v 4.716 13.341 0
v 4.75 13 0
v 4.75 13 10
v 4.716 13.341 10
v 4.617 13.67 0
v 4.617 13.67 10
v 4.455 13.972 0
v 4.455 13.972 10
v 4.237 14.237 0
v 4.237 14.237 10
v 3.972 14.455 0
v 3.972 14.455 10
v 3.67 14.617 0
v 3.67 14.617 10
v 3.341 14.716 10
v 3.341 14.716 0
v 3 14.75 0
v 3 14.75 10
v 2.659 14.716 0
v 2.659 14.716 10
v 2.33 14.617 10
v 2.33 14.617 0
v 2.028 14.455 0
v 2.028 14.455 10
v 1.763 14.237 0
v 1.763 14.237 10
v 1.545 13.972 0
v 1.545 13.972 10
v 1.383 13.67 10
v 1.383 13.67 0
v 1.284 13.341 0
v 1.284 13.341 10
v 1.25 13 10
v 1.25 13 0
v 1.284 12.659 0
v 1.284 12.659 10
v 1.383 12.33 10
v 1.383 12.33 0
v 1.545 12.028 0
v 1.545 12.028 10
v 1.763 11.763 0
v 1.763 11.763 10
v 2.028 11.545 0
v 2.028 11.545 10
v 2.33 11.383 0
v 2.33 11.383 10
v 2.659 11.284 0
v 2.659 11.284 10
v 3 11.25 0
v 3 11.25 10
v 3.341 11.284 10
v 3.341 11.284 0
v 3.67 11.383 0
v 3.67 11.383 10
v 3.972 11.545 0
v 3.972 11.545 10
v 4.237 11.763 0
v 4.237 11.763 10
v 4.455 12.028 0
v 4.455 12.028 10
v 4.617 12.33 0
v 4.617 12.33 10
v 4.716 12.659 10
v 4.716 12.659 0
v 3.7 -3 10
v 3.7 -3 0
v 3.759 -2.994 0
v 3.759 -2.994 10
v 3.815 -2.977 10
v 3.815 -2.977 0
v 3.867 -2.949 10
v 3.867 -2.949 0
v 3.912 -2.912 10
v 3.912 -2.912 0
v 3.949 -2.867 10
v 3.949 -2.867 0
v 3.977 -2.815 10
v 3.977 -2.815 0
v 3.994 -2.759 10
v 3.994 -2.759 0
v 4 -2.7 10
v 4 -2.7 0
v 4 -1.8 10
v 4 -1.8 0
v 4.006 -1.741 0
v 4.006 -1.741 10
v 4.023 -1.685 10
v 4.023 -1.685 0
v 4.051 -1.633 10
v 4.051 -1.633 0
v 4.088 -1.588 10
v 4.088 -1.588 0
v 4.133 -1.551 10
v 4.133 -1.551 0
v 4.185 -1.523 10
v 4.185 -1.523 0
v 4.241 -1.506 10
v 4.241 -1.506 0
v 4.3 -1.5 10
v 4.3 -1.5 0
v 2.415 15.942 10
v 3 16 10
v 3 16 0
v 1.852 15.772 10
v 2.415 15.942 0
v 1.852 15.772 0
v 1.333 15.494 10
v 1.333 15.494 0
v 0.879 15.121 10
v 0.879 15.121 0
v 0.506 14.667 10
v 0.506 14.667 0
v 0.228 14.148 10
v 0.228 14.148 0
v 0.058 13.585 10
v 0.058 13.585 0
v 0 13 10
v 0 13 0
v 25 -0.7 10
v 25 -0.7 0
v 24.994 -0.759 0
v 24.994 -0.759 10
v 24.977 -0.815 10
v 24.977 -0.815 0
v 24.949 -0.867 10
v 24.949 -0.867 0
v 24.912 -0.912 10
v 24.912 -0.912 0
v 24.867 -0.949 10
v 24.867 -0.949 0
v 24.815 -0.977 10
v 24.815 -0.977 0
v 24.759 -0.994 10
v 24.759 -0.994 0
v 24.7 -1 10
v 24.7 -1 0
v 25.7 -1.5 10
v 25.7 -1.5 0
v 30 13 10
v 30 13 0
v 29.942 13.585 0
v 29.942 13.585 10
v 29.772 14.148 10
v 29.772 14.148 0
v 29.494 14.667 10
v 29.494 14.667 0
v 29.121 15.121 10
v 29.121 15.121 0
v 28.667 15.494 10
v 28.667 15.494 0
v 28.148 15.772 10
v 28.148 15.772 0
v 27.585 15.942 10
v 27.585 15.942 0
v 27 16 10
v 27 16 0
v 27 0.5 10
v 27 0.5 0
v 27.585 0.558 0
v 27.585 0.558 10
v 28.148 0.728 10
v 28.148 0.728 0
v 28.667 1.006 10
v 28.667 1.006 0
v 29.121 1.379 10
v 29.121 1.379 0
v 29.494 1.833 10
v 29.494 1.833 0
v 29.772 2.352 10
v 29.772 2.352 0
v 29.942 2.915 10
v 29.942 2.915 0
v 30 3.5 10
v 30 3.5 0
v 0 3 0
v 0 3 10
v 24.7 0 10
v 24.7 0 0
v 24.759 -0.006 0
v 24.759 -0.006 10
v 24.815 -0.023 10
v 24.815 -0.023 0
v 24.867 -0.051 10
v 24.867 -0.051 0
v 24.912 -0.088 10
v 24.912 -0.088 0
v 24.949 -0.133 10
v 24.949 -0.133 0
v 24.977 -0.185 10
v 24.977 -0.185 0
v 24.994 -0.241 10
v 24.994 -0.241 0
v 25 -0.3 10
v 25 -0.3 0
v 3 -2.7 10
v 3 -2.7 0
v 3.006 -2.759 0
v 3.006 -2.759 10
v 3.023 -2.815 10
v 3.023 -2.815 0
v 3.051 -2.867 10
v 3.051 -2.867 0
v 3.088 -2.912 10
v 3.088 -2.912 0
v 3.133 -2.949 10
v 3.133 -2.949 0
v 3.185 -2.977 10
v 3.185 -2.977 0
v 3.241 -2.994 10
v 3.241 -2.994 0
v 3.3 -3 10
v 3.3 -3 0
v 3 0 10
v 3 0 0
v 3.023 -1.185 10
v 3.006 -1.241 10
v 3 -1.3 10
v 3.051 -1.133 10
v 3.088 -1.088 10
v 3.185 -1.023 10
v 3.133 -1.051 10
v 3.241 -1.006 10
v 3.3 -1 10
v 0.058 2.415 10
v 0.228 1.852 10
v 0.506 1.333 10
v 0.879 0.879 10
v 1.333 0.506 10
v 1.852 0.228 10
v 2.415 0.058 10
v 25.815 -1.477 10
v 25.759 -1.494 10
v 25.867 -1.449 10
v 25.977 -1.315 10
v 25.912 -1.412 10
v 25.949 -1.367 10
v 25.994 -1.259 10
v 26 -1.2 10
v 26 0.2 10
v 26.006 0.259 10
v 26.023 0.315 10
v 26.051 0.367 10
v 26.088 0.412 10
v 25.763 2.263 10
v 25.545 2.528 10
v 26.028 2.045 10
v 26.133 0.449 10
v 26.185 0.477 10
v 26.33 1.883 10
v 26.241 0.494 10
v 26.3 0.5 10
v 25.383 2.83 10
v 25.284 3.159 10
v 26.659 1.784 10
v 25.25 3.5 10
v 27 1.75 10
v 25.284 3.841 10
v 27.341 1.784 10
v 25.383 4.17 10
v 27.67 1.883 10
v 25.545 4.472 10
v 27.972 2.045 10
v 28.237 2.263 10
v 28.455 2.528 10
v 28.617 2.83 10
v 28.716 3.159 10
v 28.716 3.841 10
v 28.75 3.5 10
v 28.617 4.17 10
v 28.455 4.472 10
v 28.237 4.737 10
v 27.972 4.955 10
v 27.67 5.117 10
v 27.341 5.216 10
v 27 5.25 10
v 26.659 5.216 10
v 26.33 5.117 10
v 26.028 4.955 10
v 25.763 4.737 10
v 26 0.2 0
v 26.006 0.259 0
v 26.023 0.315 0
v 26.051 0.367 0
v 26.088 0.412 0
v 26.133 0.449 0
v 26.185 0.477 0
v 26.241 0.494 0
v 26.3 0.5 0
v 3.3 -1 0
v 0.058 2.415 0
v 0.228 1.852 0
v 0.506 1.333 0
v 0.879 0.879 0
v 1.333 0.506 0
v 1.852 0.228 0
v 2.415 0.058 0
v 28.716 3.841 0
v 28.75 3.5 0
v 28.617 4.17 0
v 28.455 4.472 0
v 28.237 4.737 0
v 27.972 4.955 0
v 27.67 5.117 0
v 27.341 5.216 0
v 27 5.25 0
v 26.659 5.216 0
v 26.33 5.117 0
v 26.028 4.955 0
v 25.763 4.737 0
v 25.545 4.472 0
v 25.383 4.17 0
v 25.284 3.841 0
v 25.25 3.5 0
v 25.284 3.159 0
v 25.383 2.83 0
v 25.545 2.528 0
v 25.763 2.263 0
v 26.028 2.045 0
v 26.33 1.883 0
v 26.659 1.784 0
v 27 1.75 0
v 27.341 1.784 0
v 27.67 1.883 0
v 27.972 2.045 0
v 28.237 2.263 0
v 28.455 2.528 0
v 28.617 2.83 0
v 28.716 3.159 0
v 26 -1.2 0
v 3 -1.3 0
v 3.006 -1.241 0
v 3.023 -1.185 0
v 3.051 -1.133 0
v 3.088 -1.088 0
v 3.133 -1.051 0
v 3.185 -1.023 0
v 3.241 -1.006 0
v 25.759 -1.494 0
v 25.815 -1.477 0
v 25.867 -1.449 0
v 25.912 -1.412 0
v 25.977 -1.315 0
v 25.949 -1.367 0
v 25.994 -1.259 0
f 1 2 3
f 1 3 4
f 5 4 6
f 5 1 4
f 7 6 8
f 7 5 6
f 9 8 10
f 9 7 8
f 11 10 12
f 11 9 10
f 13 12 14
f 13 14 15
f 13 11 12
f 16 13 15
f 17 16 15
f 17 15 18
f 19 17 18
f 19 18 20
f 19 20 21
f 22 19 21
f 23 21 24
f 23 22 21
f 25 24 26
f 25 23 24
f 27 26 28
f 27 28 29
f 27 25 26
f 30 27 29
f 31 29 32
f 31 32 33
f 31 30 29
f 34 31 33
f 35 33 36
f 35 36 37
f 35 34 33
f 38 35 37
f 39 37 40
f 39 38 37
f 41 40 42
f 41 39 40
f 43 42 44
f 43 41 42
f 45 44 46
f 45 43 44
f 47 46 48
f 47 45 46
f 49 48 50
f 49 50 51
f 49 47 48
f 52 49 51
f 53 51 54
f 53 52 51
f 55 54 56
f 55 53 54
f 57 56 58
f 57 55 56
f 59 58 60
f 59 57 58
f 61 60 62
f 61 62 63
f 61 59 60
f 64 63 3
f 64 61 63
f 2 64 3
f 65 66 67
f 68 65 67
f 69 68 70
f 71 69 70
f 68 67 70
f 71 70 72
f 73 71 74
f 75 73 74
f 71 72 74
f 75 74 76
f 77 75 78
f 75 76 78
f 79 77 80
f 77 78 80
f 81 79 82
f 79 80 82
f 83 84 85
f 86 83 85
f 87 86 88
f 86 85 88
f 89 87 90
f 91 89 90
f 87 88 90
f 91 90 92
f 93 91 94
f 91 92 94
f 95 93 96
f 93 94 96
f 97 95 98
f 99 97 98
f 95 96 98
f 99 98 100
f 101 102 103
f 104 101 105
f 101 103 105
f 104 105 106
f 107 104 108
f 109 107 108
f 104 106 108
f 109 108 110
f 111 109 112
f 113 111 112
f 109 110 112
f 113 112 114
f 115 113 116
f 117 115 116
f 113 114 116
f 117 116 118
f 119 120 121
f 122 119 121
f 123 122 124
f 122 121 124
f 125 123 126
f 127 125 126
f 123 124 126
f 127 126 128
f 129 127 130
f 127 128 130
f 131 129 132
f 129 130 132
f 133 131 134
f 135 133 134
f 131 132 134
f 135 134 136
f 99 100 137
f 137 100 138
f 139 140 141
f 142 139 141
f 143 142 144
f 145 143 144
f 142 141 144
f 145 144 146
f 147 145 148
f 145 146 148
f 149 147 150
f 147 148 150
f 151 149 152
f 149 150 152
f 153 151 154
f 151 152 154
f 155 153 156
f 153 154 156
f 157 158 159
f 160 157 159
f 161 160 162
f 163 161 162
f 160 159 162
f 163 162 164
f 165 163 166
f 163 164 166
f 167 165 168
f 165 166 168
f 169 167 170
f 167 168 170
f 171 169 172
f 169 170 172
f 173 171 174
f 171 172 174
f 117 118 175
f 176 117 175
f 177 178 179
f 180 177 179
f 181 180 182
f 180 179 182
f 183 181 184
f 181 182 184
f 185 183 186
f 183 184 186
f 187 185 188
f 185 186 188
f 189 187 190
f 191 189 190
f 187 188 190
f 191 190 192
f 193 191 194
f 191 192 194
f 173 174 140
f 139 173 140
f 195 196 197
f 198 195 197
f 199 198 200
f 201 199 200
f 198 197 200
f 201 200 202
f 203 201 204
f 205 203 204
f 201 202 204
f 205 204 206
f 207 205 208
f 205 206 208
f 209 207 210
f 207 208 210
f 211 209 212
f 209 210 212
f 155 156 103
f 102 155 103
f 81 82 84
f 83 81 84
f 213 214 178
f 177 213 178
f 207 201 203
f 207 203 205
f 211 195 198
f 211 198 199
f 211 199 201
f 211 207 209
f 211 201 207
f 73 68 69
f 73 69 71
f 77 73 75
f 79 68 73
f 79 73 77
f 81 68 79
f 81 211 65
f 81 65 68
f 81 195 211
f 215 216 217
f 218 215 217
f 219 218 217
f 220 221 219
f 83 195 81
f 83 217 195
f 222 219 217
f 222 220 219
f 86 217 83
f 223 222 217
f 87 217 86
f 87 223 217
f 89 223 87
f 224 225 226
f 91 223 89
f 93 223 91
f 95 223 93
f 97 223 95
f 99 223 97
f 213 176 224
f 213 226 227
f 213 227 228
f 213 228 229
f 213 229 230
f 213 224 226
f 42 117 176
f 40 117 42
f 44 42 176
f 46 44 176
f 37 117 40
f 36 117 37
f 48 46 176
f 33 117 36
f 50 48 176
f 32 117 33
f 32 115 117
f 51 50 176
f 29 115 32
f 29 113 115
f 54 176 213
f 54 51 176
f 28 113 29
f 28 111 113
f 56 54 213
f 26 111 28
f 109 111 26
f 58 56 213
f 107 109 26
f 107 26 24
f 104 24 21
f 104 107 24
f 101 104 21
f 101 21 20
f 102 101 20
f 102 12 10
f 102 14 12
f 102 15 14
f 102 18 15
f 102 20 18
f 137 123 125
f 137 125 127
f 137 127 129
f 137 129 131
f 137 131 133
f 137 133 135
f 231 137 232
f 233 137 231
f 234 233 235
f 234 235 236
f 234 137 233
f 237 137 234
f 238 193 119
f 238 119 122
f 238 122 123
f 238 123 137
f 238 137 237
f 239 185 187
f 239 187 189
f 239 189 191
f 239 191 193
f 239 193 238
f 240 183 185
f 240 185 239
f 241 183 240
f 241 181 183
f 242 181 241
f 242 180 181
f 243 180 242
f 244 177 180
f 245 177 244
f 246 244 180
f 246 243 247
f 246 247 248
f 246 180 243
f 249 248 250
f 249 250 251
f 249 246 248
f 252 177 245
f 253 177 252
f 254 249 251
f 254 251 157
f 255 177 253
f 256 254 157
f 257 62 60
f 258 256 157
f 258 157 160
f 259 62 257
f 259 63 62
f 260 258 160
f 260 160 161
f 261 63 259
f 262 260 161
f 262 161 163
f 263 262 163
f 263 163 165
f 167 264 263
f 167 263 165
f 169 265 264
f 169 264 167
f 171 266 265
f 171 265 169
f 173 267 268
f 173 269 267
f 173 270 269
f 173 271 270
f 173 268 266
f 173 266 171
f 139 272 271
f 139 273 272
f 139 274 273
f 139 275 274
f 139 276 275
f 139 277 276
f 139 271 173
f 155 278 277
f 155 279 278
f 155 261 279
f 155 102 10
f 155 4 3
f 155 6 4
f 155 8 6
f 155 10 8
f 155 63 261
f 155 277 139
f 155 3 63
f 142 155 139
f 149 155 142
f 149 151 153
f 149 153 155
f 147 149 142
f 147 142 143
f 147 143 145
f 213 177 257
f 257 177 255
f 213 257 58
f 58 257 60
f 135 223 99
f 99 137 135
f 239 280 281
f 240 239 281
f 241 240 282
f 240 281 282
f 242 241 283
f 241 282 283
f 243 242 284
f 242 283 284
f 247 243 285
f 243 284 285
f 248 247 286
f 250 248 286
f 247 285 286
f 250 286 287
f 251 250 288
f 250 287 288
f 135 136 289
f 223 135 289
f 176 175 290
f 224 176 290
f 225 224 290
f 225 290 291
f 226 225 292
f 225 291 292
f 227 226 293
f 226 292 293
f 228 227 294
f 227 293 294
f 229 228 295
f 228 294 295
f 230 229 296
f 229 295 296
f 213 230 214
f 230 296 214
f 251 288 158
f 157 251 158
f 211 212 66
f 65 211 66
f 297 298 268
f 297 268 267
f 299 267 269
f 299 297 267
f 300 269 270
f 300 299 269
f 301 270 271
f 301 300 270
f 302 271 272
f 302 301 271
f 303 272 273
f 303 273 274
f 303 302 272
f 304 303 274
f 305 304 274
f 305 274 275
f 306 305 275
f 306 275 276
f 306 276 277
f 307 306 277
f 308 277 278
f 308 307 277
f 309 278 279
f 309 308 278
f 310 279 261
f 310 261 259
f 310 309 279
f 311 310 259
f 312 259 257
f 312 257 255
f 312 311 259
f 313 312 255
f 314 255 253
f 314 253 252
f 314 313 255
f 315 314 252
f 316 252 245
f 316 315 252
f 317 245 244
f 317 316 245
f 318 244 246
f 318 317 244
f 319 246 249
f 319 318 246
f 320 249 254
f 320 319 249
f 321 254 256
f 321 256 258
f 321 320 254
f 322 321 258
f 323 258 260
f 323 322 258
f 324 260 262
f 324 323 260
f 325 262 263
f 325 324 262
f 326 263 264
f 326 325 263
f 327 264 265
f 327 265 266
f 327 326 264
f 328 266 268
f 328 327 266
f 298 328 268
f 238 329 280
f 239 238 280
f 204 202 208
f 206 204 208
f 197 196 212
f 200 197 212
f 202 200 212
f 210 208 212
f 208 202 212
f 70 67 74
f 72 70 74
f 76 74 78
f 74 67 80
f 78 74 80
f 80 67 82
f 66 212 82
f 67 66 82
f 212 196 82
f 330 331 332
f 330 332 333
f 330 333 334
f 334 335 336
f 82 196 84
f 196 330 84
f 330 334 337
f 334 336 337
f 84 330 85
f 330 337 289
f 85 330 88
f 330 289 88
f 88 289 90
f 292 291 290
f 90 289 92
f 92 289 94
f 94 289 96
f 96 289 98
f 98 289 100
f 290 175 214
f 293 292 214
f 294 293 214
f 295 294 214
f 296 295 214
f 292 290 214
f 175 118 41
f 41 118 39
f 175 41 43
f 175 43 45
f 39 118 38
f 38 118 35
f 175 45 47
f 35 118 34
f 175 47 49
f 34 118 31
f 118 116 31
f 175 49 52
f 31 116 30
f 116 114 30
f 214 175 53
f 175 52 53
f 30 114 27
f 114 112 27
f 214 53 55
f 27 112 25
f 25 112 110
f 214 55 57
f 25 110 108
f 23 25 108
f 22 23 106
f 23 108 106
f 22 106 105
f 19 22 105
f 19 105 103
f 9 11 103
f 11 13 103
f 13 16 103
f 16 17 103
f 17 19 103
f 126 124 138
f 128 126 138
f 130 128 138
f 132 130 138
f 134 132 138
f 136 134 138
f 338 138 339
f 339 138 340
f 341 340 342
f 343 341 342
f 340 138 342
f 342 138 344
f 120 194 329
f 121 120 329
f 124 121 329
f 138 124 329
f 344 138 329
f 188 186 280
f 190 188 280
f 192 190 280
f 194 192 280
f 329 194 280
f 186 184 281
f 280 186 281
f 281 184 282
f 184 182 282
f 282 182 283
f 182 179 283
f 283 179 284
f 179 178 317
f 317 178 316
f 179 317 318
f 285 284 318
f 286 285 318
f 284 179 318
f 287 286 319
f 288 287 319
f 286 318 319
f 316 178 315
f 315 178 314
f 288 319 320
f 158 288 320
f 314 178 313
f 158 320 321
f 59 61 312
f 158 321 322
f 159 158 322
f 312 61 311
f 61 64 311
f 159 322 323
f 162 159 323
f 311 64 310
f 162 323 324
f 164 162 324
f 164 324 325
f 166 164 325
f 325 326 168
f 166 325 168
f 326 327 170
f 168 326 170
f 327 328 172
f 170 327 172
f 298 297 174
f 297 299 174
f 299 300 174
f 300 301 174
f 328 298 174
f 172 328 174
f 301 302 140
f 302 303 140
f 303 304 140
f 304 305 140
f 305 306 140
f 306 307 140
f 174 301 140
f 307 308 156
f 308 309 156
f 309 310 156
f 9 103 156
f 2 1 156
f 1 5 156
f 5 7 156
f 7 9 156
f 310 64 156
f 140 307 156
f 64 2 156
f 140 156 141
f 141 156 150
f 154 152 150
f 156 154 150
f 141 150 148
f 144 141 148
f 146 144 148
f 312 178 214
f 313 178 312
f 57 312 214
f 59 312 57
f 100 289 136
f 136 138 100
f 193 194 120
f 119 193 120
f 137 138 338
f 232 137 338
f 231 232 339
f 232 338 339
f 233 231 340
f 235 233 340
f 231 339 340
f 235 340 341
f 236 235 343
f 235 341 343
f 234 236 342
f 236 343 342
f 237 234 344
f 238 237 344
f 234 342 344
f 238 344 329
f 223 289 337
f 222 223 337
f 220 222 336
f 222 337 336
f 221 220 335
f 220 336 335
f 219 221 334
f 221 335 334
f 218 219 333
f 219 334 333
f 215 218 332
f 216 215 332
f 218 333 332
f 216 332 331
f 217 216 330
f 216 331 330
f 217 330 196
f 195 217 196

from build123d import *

# Parameters (mm, degrees)
ESQUISSE1_R          = 1.75
BASE_EXTRUSION_DEPTH = 10


with BuildPart() as part:
    # Esquisse1 → Base-Extrusion (new body)
    with BuildSketch(Plane.XY):
        with BuildLine():
            Line((3, 0), (24.7, 0))
            ThreePointArc((24.7, 0), (24.912132034, -0.087867966), (25, -0.3))
            Line((25, -0.3), (25, -0.7))
            ThreePointArc((25, -0.7), (24.912132034, -0.912132034), (24.7, -1))
            Line((24.7, -1), (3.3, -1))
            ThreePointArc((3.3, -1), (3.087867966, -1.087867966), (3, -1.3))
            Line((3, -1.3), (3, -2.7))
            ThreePointArc((3, -2.7), (3.087867966, -2.912132034), (3.3, -3))
            Line((3.3, -3), (3.7, -3))
            ThreePointArc((3.7, -3), (3.912132034, -2.912132034), (4, -2.7))
            Line((4, -2.7), (4, -1.8))
            ThreePointArc((4, -1.8), (4.087867966, -1.587867966), (4.3, -1.5))
            Line((4.3, -1.5), (25.7, -1.5))
            ThreePointArc((25.7, -1.5), (25.912132034, -1.412132034), (26, -1.2))
            Line((26, -1.2), (26, 0.2))
            ThreePointArc((26, 0.2), (26.087867966, 0.412132034), (26.3, 0.5))
            Line((26.3, 0.5), (27, 0.5))
            ThreePointArc((27, 0.5), (29.121320344, 1.378679656), (30, 3.5))
            Line((30, 3.5), (30, 13))
            ThreePointArc((30, 13), (29.121320344, 15.121320344), (27, 16))
            Line((27, 16), (3, 16))
            ThreePointArc((3, 16), (0.878679656, 15.121320344), (0, 13))
            Line((0, 13), (0, 3))
            ThreePointArc((0, 3), (0.878679656, 0.878679656), (3, 0))
        make_face()
        with Locations((3, 13)):
            Circle(ESQUISSE1_R, mode=Mode.SUBTRACT)
        with Locations((27, 3.5)):
            Circle(ESQUISSE1_R, mode=Mode.SUBTRACT)
    extrude(amount=BASE_EXTRUSION_DEPTH)


solid = part.part
